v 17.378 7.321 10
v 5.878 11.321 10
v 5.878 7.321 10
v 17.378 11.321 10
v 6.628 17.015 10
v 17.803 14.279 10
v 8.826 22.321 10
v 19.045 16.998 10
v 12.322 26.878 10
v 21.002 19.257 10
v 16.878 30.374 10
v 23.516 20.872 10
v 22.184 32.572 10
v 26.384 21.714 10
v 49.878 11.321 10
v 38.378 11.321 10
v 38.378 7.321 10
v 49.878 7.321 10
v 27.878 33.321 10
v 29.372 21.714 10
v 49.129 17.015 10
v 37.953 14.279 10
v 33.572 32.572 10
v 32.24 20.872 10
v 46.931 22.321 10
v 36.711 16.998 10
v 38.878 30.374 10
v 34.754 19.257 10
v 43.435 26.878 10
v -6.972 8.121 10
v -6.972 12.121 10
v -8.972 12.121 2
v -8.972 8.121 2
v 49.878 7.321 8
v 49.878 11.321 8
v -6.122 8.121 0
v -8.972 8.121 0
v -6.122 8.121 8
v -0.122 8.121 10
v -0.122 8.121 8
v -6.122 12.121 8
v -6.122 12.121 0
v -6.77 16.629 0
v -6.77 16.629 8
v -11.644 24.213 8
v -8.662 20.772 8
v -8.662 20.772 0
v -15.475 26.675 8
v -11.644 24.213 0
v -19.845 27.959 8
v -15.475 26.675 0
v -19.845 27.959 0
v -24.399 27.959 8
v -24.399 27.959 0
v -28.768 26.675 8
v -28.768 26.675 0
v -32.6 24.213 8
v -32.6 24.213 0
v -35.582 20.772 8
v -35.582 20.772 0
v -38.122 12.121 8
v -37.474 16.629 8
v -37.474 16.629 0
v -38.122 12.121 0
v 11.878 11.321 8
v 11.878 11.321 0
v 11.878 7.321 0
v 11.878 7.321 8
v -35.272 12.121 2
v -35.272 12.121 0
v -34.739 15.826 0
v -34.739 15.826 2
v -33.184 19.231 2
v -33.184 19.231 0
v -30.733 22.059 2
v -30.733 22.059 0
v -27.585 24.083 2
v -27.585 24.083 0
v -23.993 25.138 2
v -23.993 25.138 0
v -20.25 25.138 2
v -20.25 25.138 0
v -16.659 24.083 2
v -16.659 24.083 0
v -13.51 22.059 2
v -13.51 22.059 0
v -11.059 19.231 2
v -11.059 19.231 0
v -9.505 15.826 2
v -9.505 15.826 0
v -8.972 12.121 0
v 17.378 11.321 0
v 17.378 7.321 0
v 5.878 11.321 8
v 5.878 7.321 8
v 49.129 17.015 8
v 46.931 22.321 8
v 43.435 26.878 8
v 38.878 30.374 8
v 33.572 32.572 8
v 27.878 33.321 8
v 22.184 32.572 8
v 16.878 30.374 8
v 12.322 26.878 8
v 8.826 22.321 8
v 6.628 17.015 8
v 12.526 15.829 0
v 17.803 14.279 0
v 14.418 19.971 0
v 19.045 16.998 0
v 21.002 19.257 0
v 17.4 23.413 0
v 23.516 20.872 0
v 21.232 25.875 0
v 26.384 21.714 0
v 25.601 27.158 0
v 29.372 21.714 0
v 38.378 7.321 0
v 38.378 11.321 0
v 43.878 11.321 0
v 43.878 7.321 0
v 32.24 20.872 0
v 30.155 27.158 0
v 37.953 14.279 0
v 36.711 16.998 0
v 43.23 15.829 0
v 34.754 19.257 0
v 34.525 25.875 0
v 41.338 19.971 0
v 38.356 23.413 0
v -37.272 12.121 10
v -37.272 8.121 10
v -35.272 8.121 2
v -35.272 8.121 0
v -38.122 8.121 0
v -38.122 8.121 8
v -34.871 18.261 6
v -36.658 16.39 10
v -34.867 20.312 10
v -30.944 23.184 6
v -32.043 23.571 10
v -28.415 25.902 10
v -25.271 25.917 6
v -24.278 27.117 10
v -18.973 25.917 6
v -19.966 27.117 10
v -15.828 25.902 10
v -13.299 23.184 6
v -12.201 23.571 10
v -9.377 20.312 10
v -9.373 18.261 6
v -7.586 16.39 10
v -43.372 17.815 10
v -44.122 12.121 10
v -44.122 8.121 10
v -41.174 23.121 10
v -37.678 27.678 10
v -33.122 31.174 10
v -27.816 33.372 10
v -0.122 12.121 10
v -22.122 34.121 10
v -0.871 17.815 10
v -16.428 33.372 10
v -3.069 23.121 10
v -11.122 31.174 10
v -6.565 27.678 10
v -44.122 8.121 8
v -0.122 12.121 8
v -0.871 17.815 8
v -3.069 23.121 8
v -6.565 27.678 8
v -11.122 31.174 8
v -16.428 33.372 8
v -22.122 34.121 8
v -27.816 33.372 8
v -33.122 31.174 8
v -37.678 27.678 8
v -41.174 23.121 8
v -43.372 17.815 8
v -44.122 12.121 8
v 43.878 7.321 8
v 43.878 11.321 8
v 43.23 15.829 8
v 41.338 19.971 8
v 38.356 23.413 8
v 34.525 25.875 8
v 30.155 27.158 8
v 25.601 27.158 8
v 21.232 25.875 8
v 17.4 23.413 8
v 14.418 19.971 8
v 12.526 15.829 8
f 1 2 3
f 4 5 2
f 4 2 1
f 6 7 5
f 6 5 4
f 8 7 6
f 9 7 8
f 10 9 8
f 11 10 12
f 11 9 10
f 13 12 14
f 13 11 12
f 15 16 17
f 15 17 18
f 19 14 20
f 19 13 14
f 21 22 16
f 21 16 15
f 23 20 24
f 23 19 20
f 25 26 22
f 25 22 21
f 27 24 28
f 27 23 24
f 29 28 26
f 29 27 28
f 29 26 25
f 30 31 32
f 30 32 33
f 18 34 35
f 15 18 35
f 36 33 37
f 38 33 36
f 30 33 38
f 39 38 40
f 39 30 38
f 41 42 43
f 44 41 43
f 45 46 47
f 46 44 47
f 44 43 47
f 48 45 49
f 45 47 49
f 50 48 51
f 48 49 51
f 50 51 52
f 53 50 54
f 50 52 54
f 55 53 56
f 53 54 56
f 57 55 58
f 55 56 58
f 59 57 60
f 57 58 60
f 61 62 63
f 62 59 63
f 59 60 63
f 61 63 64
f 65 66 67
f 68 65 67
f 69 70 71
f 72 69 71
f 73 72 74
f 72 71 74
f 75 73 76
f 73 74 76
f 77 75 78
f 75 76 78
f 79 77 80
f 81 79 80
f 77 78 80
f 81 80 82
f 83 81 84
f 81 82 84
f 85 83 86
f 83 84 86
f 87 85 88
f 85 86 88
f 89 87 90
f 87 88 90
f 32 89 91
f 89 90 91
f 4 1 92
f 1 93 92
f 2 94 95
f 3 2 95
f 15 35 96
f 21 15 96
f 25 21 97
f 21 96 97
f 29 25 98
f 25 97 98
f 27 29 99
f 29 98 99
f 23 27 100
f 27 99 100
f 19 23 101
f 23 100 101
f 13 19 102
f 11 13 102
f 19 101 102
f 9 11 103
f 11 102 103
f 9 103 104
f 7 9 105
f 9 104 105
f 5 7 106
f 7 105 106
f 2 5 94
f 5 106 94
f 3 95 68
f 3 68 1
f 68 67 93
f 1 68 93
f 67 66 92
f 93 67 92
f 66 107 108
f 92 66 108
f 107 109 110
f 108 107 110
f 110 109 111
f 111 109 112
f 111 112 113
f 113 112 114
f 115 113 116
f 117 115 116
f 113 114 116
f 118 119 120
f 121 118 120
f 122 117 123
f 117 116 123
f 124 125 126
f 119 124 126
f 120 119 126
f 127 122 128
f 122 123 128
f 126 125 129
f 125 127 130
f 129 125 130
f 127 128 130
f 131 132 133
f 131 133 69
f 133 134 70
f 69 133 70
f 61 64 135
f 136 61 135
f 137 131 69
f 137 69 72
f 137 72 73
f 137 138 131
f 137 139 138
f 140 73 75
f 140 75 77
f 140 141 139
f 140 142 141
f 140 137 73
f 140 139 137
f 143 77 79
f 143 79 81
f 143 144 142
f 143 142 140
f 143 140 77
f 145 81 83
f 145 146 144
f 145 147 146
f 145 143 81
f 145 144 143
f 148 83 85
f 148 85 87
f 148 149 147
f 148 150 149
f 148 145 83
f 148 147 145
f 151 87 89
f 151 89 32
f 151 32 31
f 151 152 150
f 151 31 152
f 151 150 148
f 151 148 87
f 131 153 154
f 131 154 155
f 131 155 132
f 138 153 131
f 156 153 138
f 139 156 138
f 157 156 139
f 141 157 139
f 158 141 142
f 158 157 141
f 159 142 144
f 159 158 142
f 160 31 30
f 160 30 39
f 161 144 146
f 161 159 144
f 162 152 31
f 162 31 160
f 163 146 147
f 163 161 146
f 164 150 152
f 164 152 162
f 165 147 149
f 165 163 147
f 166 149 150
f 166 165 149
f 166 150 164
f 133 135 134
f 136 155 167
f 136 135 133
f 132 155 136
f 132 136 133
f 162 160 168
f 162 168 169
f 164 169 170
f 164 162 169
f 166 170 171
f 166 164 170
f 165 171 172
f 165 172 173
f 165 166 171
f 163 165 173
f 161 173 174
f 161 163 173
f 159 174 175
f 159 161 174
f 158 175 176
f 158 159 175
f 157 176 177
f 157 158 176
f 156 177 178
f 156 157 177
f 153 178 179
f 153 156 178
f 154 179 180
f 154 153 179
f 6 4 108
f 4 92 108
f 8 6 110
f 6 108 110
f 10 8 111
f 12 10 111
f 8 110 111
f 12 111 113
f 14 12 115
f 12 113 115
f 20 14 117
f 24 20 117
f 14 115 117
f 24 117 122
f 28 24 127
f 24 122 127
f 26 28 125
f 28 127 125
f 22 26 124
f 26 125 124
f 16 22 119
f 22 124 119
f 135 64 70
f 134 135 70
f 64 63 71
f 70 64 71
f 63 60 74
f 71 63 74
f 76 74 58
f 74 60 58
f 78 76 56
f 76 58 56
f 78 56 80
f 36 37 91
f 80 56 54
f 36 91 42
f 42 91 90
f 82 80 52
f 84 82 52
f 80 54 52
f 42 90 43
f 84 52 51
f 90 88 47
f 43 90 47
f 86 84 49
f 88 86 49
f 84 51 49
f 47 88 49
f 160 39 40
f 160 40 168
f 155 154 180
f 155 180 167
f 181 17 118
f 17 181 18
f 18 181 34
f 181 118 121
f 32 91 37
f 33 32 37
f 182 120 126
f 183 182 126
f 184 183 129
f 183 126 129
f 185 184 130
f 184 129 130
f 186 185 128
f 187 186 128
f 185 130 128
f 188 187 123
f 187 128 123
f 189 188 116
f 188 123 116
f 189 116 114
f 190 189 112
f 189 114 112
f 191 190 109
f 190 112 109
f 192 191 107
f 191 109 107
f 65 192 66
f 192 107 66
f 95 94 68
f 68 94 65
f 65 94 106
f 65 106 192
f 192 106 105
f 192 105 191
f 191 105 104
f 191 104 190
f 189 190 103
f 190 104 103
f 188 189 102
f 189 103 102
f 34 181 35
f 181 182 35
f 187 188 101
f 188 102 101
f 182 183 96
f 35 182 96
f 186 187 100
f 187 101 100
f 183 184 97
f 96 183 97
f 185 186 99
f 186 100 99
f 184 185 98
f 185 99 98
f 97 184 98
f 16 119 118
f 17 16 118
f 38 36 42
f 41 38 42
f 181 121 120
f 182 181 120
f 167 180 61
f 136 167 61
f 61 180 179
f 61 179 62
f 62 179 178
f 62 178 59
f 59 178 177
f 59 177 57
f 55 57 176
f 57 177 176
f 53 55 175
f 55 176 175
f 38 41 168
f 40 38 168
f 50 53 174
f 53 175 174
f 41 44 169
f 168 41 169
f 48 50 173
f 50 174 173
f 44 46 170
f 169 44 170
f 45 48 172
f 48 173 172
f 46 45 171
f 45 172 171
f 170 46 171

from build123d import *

# Parameters (mm, degrees)
F1_DEPTH = 10
F2_DEPTH = 8
F4_DEPTH = 2
F5_SIZE2 = 2
F5_SIZE  = 8
F7_DEPTH = 2


with BuildPart() as f1:
    # F0 (on Top) → F1 (new body)
    with BuildSketch(Plane.XY):
        with BuildLine():
            ThreePointArc((-35.2718485385, 12.1213712692), (-22.1218485385, 25.2713712692), (-8.9718485385, 12.1213712692))
            Line((-8.9718485385, 12.1213712692), (-8.9718485385, 8.1213712692))
            Line((-8.9718485385, 8.1213712692), (-6.1218485385, 8.1213712692))
            Line((-6.1218485385, 8.1213712692), (-6.1218485385, 12.1213712692))
            ThreePointArc((-6.1218485385, 12.1213712692), (-22.1218485385, 28.1213712692), (-38.1218485385, 12.1213712692))
            Line((-38.1218485385, 12.1213712692), (-38.1218485385, 8.1213712692))
            Line((-38.1218485385, 8.1213712692), (-35.2718485385, 8.1213712692))
            Line((-35.2718485385, 8.1213712692), (-35.2718485385, 12.1213712692))
        make_face()
    extrude(amount=F1_DEPTH)

    # F5
    f5_edges = [f1.edges().sort_by_distance(p)[0] for p in [
        (-22.121849, 25.271371, 10),
    ]]
    f5_side = f1.faces().sort_by_distance((-22.121849, 25.271371, 5))[0]
    chamfer(f5_edges, length=F5_SIZE, length2=F5_SIZE2, reference=f5_side)

    # F6 (on face) → F7 (join)
    with BuildSketch(Plane.XY.offset(10)):
        with BuildLine():
            ThreePointArc((-0.1218485385, 12.1213712692), (-22.1218485385, 34.1213712692), (-44.1218485385, 12.1213712692))
            Line((-44.1218485385, 12.1213712692), (-44.1218485385, 8.1213712692))
            Line((-44.1218485385, 8.1213712692), (-38.1218485385, 8.1213712692))
            Line((-38.1218485385, 8.1213712692), (-38.1218485385, 12.1213712692))
            ThreePointArc((-38.1218485385, 12.1213712692), (-22.1218485385, 28.1213712692), (-6.1218485385, 12.1213712692))
            Line((-6.1218485385, 12.1213712692), (-6.1218485385, 8.1213712692))
            Line((-6.1218485385, 8.1213712692), (-0.1218485385, 8.1213712692))
            Line((-0.1218485385, 8.1213712692), (-0.1218485385, 12.1213712692))
        make_face()
    extrude(amount=-F7_DEPTH)


with BuildPart() as f2:
    # F0 (on Top) → F2 (new body)
    with BuildSketch(Plane.XY):
        with BuildLine():
            ThreePointArc((17.3781514615, 11.3211924173), (27.8781514615, 21.8211924173), (38.3781514615, 11.3211924173))
            Line((38.3781514615, 11.3211924173), (38.3781514615, 7.3211924173))
            Line((38.3781514615, 7.3211924173), (43.8781514615, 7.3211924173))
            Line((43.8781514615, 7.3211924173), (43.8781514615, 11.3211924173))
            ThreePointArc((43.8781514615, 11.3211924173), (27.8781514615, 27.3211924173), (11.8781514615, 11.3211924173))
            Line((11.8781514615, 11.3211924173), (11.8781514615, 7.3211924173))
            Line((11.8781514615, 7.3211924173), (17.3781514615, 7.3211924173))
            Line((17.3781514615, 7.3211924173), (17.3781514615, 11.3211924173))
        make_face()
    extrude(amount=F2_DEPTH)

    # F3 (on face) → F4 (join)
    with BuildSketch(Plane.XY.offset(8)):
        with BuildLine():
            ThreePointArc((49.8781514615, 11.3211924173), (27.8781514615, 33.3211924173), (5.8781514615, 11.3211924173))
            Line((5.8781514615, 11.3211924173), (5.8781514615, 7.3211924173))
            Line((5.8781514615, 7.3211924173), (11.8781514615, 7.3211924173))
            Line((11.8781514615, 7.3211924173), (11.8781514615, 11.3211924173))
            ThreePointArc((11.8781514615, 11.3211924173), (27.8781514615, 27.3211924173), (43.8781514615, 11.3211924173))
            Line((43.8781514615, 11.3211924173), (43.8781514615, 7.3211924173))
            Line((43.8781514615, 7.3211924173), (49.8781514615, 7.3211924173))
            Line((49.8781514615, 7.3211924173), (49.8781514615, 11.3211924173))
        make_face()
        with BuildLine():
            Line((11.8781514615, 11.3211924173), (11.8781514615, 7.3211924173))
            Line((11.8781514615, 7.3211924173), (17.3781514615, 7.3211924173))
            Line((17.3781514615, 7.3211924173), (17.3781514615, 11.3211924173))
            ThreePointArc((17.3781514615, 11.3211924173), (27.8781514615, 21.8211924173), (38.3781514615, 11.3211924173))
            Line((38.3781514615, 11.3211924173), (38.3781514615, 7.3211924173))
            Line((38.3781514615, 7.3211924173), (43.8781514615, 7.3211924173))
            Line((43.8781514615, 7.3211924173), (43.8781514615, 11.3211924173))
            ThreePointArc((43.8781514615, 11.3211924173), (27.8781514615, 27.3211924173), (11.8781514615, 11.3211924173))
        make_face()
    extrude(amount=F4_DEPTH)


solid = Compound([f1.part, f2.part])
